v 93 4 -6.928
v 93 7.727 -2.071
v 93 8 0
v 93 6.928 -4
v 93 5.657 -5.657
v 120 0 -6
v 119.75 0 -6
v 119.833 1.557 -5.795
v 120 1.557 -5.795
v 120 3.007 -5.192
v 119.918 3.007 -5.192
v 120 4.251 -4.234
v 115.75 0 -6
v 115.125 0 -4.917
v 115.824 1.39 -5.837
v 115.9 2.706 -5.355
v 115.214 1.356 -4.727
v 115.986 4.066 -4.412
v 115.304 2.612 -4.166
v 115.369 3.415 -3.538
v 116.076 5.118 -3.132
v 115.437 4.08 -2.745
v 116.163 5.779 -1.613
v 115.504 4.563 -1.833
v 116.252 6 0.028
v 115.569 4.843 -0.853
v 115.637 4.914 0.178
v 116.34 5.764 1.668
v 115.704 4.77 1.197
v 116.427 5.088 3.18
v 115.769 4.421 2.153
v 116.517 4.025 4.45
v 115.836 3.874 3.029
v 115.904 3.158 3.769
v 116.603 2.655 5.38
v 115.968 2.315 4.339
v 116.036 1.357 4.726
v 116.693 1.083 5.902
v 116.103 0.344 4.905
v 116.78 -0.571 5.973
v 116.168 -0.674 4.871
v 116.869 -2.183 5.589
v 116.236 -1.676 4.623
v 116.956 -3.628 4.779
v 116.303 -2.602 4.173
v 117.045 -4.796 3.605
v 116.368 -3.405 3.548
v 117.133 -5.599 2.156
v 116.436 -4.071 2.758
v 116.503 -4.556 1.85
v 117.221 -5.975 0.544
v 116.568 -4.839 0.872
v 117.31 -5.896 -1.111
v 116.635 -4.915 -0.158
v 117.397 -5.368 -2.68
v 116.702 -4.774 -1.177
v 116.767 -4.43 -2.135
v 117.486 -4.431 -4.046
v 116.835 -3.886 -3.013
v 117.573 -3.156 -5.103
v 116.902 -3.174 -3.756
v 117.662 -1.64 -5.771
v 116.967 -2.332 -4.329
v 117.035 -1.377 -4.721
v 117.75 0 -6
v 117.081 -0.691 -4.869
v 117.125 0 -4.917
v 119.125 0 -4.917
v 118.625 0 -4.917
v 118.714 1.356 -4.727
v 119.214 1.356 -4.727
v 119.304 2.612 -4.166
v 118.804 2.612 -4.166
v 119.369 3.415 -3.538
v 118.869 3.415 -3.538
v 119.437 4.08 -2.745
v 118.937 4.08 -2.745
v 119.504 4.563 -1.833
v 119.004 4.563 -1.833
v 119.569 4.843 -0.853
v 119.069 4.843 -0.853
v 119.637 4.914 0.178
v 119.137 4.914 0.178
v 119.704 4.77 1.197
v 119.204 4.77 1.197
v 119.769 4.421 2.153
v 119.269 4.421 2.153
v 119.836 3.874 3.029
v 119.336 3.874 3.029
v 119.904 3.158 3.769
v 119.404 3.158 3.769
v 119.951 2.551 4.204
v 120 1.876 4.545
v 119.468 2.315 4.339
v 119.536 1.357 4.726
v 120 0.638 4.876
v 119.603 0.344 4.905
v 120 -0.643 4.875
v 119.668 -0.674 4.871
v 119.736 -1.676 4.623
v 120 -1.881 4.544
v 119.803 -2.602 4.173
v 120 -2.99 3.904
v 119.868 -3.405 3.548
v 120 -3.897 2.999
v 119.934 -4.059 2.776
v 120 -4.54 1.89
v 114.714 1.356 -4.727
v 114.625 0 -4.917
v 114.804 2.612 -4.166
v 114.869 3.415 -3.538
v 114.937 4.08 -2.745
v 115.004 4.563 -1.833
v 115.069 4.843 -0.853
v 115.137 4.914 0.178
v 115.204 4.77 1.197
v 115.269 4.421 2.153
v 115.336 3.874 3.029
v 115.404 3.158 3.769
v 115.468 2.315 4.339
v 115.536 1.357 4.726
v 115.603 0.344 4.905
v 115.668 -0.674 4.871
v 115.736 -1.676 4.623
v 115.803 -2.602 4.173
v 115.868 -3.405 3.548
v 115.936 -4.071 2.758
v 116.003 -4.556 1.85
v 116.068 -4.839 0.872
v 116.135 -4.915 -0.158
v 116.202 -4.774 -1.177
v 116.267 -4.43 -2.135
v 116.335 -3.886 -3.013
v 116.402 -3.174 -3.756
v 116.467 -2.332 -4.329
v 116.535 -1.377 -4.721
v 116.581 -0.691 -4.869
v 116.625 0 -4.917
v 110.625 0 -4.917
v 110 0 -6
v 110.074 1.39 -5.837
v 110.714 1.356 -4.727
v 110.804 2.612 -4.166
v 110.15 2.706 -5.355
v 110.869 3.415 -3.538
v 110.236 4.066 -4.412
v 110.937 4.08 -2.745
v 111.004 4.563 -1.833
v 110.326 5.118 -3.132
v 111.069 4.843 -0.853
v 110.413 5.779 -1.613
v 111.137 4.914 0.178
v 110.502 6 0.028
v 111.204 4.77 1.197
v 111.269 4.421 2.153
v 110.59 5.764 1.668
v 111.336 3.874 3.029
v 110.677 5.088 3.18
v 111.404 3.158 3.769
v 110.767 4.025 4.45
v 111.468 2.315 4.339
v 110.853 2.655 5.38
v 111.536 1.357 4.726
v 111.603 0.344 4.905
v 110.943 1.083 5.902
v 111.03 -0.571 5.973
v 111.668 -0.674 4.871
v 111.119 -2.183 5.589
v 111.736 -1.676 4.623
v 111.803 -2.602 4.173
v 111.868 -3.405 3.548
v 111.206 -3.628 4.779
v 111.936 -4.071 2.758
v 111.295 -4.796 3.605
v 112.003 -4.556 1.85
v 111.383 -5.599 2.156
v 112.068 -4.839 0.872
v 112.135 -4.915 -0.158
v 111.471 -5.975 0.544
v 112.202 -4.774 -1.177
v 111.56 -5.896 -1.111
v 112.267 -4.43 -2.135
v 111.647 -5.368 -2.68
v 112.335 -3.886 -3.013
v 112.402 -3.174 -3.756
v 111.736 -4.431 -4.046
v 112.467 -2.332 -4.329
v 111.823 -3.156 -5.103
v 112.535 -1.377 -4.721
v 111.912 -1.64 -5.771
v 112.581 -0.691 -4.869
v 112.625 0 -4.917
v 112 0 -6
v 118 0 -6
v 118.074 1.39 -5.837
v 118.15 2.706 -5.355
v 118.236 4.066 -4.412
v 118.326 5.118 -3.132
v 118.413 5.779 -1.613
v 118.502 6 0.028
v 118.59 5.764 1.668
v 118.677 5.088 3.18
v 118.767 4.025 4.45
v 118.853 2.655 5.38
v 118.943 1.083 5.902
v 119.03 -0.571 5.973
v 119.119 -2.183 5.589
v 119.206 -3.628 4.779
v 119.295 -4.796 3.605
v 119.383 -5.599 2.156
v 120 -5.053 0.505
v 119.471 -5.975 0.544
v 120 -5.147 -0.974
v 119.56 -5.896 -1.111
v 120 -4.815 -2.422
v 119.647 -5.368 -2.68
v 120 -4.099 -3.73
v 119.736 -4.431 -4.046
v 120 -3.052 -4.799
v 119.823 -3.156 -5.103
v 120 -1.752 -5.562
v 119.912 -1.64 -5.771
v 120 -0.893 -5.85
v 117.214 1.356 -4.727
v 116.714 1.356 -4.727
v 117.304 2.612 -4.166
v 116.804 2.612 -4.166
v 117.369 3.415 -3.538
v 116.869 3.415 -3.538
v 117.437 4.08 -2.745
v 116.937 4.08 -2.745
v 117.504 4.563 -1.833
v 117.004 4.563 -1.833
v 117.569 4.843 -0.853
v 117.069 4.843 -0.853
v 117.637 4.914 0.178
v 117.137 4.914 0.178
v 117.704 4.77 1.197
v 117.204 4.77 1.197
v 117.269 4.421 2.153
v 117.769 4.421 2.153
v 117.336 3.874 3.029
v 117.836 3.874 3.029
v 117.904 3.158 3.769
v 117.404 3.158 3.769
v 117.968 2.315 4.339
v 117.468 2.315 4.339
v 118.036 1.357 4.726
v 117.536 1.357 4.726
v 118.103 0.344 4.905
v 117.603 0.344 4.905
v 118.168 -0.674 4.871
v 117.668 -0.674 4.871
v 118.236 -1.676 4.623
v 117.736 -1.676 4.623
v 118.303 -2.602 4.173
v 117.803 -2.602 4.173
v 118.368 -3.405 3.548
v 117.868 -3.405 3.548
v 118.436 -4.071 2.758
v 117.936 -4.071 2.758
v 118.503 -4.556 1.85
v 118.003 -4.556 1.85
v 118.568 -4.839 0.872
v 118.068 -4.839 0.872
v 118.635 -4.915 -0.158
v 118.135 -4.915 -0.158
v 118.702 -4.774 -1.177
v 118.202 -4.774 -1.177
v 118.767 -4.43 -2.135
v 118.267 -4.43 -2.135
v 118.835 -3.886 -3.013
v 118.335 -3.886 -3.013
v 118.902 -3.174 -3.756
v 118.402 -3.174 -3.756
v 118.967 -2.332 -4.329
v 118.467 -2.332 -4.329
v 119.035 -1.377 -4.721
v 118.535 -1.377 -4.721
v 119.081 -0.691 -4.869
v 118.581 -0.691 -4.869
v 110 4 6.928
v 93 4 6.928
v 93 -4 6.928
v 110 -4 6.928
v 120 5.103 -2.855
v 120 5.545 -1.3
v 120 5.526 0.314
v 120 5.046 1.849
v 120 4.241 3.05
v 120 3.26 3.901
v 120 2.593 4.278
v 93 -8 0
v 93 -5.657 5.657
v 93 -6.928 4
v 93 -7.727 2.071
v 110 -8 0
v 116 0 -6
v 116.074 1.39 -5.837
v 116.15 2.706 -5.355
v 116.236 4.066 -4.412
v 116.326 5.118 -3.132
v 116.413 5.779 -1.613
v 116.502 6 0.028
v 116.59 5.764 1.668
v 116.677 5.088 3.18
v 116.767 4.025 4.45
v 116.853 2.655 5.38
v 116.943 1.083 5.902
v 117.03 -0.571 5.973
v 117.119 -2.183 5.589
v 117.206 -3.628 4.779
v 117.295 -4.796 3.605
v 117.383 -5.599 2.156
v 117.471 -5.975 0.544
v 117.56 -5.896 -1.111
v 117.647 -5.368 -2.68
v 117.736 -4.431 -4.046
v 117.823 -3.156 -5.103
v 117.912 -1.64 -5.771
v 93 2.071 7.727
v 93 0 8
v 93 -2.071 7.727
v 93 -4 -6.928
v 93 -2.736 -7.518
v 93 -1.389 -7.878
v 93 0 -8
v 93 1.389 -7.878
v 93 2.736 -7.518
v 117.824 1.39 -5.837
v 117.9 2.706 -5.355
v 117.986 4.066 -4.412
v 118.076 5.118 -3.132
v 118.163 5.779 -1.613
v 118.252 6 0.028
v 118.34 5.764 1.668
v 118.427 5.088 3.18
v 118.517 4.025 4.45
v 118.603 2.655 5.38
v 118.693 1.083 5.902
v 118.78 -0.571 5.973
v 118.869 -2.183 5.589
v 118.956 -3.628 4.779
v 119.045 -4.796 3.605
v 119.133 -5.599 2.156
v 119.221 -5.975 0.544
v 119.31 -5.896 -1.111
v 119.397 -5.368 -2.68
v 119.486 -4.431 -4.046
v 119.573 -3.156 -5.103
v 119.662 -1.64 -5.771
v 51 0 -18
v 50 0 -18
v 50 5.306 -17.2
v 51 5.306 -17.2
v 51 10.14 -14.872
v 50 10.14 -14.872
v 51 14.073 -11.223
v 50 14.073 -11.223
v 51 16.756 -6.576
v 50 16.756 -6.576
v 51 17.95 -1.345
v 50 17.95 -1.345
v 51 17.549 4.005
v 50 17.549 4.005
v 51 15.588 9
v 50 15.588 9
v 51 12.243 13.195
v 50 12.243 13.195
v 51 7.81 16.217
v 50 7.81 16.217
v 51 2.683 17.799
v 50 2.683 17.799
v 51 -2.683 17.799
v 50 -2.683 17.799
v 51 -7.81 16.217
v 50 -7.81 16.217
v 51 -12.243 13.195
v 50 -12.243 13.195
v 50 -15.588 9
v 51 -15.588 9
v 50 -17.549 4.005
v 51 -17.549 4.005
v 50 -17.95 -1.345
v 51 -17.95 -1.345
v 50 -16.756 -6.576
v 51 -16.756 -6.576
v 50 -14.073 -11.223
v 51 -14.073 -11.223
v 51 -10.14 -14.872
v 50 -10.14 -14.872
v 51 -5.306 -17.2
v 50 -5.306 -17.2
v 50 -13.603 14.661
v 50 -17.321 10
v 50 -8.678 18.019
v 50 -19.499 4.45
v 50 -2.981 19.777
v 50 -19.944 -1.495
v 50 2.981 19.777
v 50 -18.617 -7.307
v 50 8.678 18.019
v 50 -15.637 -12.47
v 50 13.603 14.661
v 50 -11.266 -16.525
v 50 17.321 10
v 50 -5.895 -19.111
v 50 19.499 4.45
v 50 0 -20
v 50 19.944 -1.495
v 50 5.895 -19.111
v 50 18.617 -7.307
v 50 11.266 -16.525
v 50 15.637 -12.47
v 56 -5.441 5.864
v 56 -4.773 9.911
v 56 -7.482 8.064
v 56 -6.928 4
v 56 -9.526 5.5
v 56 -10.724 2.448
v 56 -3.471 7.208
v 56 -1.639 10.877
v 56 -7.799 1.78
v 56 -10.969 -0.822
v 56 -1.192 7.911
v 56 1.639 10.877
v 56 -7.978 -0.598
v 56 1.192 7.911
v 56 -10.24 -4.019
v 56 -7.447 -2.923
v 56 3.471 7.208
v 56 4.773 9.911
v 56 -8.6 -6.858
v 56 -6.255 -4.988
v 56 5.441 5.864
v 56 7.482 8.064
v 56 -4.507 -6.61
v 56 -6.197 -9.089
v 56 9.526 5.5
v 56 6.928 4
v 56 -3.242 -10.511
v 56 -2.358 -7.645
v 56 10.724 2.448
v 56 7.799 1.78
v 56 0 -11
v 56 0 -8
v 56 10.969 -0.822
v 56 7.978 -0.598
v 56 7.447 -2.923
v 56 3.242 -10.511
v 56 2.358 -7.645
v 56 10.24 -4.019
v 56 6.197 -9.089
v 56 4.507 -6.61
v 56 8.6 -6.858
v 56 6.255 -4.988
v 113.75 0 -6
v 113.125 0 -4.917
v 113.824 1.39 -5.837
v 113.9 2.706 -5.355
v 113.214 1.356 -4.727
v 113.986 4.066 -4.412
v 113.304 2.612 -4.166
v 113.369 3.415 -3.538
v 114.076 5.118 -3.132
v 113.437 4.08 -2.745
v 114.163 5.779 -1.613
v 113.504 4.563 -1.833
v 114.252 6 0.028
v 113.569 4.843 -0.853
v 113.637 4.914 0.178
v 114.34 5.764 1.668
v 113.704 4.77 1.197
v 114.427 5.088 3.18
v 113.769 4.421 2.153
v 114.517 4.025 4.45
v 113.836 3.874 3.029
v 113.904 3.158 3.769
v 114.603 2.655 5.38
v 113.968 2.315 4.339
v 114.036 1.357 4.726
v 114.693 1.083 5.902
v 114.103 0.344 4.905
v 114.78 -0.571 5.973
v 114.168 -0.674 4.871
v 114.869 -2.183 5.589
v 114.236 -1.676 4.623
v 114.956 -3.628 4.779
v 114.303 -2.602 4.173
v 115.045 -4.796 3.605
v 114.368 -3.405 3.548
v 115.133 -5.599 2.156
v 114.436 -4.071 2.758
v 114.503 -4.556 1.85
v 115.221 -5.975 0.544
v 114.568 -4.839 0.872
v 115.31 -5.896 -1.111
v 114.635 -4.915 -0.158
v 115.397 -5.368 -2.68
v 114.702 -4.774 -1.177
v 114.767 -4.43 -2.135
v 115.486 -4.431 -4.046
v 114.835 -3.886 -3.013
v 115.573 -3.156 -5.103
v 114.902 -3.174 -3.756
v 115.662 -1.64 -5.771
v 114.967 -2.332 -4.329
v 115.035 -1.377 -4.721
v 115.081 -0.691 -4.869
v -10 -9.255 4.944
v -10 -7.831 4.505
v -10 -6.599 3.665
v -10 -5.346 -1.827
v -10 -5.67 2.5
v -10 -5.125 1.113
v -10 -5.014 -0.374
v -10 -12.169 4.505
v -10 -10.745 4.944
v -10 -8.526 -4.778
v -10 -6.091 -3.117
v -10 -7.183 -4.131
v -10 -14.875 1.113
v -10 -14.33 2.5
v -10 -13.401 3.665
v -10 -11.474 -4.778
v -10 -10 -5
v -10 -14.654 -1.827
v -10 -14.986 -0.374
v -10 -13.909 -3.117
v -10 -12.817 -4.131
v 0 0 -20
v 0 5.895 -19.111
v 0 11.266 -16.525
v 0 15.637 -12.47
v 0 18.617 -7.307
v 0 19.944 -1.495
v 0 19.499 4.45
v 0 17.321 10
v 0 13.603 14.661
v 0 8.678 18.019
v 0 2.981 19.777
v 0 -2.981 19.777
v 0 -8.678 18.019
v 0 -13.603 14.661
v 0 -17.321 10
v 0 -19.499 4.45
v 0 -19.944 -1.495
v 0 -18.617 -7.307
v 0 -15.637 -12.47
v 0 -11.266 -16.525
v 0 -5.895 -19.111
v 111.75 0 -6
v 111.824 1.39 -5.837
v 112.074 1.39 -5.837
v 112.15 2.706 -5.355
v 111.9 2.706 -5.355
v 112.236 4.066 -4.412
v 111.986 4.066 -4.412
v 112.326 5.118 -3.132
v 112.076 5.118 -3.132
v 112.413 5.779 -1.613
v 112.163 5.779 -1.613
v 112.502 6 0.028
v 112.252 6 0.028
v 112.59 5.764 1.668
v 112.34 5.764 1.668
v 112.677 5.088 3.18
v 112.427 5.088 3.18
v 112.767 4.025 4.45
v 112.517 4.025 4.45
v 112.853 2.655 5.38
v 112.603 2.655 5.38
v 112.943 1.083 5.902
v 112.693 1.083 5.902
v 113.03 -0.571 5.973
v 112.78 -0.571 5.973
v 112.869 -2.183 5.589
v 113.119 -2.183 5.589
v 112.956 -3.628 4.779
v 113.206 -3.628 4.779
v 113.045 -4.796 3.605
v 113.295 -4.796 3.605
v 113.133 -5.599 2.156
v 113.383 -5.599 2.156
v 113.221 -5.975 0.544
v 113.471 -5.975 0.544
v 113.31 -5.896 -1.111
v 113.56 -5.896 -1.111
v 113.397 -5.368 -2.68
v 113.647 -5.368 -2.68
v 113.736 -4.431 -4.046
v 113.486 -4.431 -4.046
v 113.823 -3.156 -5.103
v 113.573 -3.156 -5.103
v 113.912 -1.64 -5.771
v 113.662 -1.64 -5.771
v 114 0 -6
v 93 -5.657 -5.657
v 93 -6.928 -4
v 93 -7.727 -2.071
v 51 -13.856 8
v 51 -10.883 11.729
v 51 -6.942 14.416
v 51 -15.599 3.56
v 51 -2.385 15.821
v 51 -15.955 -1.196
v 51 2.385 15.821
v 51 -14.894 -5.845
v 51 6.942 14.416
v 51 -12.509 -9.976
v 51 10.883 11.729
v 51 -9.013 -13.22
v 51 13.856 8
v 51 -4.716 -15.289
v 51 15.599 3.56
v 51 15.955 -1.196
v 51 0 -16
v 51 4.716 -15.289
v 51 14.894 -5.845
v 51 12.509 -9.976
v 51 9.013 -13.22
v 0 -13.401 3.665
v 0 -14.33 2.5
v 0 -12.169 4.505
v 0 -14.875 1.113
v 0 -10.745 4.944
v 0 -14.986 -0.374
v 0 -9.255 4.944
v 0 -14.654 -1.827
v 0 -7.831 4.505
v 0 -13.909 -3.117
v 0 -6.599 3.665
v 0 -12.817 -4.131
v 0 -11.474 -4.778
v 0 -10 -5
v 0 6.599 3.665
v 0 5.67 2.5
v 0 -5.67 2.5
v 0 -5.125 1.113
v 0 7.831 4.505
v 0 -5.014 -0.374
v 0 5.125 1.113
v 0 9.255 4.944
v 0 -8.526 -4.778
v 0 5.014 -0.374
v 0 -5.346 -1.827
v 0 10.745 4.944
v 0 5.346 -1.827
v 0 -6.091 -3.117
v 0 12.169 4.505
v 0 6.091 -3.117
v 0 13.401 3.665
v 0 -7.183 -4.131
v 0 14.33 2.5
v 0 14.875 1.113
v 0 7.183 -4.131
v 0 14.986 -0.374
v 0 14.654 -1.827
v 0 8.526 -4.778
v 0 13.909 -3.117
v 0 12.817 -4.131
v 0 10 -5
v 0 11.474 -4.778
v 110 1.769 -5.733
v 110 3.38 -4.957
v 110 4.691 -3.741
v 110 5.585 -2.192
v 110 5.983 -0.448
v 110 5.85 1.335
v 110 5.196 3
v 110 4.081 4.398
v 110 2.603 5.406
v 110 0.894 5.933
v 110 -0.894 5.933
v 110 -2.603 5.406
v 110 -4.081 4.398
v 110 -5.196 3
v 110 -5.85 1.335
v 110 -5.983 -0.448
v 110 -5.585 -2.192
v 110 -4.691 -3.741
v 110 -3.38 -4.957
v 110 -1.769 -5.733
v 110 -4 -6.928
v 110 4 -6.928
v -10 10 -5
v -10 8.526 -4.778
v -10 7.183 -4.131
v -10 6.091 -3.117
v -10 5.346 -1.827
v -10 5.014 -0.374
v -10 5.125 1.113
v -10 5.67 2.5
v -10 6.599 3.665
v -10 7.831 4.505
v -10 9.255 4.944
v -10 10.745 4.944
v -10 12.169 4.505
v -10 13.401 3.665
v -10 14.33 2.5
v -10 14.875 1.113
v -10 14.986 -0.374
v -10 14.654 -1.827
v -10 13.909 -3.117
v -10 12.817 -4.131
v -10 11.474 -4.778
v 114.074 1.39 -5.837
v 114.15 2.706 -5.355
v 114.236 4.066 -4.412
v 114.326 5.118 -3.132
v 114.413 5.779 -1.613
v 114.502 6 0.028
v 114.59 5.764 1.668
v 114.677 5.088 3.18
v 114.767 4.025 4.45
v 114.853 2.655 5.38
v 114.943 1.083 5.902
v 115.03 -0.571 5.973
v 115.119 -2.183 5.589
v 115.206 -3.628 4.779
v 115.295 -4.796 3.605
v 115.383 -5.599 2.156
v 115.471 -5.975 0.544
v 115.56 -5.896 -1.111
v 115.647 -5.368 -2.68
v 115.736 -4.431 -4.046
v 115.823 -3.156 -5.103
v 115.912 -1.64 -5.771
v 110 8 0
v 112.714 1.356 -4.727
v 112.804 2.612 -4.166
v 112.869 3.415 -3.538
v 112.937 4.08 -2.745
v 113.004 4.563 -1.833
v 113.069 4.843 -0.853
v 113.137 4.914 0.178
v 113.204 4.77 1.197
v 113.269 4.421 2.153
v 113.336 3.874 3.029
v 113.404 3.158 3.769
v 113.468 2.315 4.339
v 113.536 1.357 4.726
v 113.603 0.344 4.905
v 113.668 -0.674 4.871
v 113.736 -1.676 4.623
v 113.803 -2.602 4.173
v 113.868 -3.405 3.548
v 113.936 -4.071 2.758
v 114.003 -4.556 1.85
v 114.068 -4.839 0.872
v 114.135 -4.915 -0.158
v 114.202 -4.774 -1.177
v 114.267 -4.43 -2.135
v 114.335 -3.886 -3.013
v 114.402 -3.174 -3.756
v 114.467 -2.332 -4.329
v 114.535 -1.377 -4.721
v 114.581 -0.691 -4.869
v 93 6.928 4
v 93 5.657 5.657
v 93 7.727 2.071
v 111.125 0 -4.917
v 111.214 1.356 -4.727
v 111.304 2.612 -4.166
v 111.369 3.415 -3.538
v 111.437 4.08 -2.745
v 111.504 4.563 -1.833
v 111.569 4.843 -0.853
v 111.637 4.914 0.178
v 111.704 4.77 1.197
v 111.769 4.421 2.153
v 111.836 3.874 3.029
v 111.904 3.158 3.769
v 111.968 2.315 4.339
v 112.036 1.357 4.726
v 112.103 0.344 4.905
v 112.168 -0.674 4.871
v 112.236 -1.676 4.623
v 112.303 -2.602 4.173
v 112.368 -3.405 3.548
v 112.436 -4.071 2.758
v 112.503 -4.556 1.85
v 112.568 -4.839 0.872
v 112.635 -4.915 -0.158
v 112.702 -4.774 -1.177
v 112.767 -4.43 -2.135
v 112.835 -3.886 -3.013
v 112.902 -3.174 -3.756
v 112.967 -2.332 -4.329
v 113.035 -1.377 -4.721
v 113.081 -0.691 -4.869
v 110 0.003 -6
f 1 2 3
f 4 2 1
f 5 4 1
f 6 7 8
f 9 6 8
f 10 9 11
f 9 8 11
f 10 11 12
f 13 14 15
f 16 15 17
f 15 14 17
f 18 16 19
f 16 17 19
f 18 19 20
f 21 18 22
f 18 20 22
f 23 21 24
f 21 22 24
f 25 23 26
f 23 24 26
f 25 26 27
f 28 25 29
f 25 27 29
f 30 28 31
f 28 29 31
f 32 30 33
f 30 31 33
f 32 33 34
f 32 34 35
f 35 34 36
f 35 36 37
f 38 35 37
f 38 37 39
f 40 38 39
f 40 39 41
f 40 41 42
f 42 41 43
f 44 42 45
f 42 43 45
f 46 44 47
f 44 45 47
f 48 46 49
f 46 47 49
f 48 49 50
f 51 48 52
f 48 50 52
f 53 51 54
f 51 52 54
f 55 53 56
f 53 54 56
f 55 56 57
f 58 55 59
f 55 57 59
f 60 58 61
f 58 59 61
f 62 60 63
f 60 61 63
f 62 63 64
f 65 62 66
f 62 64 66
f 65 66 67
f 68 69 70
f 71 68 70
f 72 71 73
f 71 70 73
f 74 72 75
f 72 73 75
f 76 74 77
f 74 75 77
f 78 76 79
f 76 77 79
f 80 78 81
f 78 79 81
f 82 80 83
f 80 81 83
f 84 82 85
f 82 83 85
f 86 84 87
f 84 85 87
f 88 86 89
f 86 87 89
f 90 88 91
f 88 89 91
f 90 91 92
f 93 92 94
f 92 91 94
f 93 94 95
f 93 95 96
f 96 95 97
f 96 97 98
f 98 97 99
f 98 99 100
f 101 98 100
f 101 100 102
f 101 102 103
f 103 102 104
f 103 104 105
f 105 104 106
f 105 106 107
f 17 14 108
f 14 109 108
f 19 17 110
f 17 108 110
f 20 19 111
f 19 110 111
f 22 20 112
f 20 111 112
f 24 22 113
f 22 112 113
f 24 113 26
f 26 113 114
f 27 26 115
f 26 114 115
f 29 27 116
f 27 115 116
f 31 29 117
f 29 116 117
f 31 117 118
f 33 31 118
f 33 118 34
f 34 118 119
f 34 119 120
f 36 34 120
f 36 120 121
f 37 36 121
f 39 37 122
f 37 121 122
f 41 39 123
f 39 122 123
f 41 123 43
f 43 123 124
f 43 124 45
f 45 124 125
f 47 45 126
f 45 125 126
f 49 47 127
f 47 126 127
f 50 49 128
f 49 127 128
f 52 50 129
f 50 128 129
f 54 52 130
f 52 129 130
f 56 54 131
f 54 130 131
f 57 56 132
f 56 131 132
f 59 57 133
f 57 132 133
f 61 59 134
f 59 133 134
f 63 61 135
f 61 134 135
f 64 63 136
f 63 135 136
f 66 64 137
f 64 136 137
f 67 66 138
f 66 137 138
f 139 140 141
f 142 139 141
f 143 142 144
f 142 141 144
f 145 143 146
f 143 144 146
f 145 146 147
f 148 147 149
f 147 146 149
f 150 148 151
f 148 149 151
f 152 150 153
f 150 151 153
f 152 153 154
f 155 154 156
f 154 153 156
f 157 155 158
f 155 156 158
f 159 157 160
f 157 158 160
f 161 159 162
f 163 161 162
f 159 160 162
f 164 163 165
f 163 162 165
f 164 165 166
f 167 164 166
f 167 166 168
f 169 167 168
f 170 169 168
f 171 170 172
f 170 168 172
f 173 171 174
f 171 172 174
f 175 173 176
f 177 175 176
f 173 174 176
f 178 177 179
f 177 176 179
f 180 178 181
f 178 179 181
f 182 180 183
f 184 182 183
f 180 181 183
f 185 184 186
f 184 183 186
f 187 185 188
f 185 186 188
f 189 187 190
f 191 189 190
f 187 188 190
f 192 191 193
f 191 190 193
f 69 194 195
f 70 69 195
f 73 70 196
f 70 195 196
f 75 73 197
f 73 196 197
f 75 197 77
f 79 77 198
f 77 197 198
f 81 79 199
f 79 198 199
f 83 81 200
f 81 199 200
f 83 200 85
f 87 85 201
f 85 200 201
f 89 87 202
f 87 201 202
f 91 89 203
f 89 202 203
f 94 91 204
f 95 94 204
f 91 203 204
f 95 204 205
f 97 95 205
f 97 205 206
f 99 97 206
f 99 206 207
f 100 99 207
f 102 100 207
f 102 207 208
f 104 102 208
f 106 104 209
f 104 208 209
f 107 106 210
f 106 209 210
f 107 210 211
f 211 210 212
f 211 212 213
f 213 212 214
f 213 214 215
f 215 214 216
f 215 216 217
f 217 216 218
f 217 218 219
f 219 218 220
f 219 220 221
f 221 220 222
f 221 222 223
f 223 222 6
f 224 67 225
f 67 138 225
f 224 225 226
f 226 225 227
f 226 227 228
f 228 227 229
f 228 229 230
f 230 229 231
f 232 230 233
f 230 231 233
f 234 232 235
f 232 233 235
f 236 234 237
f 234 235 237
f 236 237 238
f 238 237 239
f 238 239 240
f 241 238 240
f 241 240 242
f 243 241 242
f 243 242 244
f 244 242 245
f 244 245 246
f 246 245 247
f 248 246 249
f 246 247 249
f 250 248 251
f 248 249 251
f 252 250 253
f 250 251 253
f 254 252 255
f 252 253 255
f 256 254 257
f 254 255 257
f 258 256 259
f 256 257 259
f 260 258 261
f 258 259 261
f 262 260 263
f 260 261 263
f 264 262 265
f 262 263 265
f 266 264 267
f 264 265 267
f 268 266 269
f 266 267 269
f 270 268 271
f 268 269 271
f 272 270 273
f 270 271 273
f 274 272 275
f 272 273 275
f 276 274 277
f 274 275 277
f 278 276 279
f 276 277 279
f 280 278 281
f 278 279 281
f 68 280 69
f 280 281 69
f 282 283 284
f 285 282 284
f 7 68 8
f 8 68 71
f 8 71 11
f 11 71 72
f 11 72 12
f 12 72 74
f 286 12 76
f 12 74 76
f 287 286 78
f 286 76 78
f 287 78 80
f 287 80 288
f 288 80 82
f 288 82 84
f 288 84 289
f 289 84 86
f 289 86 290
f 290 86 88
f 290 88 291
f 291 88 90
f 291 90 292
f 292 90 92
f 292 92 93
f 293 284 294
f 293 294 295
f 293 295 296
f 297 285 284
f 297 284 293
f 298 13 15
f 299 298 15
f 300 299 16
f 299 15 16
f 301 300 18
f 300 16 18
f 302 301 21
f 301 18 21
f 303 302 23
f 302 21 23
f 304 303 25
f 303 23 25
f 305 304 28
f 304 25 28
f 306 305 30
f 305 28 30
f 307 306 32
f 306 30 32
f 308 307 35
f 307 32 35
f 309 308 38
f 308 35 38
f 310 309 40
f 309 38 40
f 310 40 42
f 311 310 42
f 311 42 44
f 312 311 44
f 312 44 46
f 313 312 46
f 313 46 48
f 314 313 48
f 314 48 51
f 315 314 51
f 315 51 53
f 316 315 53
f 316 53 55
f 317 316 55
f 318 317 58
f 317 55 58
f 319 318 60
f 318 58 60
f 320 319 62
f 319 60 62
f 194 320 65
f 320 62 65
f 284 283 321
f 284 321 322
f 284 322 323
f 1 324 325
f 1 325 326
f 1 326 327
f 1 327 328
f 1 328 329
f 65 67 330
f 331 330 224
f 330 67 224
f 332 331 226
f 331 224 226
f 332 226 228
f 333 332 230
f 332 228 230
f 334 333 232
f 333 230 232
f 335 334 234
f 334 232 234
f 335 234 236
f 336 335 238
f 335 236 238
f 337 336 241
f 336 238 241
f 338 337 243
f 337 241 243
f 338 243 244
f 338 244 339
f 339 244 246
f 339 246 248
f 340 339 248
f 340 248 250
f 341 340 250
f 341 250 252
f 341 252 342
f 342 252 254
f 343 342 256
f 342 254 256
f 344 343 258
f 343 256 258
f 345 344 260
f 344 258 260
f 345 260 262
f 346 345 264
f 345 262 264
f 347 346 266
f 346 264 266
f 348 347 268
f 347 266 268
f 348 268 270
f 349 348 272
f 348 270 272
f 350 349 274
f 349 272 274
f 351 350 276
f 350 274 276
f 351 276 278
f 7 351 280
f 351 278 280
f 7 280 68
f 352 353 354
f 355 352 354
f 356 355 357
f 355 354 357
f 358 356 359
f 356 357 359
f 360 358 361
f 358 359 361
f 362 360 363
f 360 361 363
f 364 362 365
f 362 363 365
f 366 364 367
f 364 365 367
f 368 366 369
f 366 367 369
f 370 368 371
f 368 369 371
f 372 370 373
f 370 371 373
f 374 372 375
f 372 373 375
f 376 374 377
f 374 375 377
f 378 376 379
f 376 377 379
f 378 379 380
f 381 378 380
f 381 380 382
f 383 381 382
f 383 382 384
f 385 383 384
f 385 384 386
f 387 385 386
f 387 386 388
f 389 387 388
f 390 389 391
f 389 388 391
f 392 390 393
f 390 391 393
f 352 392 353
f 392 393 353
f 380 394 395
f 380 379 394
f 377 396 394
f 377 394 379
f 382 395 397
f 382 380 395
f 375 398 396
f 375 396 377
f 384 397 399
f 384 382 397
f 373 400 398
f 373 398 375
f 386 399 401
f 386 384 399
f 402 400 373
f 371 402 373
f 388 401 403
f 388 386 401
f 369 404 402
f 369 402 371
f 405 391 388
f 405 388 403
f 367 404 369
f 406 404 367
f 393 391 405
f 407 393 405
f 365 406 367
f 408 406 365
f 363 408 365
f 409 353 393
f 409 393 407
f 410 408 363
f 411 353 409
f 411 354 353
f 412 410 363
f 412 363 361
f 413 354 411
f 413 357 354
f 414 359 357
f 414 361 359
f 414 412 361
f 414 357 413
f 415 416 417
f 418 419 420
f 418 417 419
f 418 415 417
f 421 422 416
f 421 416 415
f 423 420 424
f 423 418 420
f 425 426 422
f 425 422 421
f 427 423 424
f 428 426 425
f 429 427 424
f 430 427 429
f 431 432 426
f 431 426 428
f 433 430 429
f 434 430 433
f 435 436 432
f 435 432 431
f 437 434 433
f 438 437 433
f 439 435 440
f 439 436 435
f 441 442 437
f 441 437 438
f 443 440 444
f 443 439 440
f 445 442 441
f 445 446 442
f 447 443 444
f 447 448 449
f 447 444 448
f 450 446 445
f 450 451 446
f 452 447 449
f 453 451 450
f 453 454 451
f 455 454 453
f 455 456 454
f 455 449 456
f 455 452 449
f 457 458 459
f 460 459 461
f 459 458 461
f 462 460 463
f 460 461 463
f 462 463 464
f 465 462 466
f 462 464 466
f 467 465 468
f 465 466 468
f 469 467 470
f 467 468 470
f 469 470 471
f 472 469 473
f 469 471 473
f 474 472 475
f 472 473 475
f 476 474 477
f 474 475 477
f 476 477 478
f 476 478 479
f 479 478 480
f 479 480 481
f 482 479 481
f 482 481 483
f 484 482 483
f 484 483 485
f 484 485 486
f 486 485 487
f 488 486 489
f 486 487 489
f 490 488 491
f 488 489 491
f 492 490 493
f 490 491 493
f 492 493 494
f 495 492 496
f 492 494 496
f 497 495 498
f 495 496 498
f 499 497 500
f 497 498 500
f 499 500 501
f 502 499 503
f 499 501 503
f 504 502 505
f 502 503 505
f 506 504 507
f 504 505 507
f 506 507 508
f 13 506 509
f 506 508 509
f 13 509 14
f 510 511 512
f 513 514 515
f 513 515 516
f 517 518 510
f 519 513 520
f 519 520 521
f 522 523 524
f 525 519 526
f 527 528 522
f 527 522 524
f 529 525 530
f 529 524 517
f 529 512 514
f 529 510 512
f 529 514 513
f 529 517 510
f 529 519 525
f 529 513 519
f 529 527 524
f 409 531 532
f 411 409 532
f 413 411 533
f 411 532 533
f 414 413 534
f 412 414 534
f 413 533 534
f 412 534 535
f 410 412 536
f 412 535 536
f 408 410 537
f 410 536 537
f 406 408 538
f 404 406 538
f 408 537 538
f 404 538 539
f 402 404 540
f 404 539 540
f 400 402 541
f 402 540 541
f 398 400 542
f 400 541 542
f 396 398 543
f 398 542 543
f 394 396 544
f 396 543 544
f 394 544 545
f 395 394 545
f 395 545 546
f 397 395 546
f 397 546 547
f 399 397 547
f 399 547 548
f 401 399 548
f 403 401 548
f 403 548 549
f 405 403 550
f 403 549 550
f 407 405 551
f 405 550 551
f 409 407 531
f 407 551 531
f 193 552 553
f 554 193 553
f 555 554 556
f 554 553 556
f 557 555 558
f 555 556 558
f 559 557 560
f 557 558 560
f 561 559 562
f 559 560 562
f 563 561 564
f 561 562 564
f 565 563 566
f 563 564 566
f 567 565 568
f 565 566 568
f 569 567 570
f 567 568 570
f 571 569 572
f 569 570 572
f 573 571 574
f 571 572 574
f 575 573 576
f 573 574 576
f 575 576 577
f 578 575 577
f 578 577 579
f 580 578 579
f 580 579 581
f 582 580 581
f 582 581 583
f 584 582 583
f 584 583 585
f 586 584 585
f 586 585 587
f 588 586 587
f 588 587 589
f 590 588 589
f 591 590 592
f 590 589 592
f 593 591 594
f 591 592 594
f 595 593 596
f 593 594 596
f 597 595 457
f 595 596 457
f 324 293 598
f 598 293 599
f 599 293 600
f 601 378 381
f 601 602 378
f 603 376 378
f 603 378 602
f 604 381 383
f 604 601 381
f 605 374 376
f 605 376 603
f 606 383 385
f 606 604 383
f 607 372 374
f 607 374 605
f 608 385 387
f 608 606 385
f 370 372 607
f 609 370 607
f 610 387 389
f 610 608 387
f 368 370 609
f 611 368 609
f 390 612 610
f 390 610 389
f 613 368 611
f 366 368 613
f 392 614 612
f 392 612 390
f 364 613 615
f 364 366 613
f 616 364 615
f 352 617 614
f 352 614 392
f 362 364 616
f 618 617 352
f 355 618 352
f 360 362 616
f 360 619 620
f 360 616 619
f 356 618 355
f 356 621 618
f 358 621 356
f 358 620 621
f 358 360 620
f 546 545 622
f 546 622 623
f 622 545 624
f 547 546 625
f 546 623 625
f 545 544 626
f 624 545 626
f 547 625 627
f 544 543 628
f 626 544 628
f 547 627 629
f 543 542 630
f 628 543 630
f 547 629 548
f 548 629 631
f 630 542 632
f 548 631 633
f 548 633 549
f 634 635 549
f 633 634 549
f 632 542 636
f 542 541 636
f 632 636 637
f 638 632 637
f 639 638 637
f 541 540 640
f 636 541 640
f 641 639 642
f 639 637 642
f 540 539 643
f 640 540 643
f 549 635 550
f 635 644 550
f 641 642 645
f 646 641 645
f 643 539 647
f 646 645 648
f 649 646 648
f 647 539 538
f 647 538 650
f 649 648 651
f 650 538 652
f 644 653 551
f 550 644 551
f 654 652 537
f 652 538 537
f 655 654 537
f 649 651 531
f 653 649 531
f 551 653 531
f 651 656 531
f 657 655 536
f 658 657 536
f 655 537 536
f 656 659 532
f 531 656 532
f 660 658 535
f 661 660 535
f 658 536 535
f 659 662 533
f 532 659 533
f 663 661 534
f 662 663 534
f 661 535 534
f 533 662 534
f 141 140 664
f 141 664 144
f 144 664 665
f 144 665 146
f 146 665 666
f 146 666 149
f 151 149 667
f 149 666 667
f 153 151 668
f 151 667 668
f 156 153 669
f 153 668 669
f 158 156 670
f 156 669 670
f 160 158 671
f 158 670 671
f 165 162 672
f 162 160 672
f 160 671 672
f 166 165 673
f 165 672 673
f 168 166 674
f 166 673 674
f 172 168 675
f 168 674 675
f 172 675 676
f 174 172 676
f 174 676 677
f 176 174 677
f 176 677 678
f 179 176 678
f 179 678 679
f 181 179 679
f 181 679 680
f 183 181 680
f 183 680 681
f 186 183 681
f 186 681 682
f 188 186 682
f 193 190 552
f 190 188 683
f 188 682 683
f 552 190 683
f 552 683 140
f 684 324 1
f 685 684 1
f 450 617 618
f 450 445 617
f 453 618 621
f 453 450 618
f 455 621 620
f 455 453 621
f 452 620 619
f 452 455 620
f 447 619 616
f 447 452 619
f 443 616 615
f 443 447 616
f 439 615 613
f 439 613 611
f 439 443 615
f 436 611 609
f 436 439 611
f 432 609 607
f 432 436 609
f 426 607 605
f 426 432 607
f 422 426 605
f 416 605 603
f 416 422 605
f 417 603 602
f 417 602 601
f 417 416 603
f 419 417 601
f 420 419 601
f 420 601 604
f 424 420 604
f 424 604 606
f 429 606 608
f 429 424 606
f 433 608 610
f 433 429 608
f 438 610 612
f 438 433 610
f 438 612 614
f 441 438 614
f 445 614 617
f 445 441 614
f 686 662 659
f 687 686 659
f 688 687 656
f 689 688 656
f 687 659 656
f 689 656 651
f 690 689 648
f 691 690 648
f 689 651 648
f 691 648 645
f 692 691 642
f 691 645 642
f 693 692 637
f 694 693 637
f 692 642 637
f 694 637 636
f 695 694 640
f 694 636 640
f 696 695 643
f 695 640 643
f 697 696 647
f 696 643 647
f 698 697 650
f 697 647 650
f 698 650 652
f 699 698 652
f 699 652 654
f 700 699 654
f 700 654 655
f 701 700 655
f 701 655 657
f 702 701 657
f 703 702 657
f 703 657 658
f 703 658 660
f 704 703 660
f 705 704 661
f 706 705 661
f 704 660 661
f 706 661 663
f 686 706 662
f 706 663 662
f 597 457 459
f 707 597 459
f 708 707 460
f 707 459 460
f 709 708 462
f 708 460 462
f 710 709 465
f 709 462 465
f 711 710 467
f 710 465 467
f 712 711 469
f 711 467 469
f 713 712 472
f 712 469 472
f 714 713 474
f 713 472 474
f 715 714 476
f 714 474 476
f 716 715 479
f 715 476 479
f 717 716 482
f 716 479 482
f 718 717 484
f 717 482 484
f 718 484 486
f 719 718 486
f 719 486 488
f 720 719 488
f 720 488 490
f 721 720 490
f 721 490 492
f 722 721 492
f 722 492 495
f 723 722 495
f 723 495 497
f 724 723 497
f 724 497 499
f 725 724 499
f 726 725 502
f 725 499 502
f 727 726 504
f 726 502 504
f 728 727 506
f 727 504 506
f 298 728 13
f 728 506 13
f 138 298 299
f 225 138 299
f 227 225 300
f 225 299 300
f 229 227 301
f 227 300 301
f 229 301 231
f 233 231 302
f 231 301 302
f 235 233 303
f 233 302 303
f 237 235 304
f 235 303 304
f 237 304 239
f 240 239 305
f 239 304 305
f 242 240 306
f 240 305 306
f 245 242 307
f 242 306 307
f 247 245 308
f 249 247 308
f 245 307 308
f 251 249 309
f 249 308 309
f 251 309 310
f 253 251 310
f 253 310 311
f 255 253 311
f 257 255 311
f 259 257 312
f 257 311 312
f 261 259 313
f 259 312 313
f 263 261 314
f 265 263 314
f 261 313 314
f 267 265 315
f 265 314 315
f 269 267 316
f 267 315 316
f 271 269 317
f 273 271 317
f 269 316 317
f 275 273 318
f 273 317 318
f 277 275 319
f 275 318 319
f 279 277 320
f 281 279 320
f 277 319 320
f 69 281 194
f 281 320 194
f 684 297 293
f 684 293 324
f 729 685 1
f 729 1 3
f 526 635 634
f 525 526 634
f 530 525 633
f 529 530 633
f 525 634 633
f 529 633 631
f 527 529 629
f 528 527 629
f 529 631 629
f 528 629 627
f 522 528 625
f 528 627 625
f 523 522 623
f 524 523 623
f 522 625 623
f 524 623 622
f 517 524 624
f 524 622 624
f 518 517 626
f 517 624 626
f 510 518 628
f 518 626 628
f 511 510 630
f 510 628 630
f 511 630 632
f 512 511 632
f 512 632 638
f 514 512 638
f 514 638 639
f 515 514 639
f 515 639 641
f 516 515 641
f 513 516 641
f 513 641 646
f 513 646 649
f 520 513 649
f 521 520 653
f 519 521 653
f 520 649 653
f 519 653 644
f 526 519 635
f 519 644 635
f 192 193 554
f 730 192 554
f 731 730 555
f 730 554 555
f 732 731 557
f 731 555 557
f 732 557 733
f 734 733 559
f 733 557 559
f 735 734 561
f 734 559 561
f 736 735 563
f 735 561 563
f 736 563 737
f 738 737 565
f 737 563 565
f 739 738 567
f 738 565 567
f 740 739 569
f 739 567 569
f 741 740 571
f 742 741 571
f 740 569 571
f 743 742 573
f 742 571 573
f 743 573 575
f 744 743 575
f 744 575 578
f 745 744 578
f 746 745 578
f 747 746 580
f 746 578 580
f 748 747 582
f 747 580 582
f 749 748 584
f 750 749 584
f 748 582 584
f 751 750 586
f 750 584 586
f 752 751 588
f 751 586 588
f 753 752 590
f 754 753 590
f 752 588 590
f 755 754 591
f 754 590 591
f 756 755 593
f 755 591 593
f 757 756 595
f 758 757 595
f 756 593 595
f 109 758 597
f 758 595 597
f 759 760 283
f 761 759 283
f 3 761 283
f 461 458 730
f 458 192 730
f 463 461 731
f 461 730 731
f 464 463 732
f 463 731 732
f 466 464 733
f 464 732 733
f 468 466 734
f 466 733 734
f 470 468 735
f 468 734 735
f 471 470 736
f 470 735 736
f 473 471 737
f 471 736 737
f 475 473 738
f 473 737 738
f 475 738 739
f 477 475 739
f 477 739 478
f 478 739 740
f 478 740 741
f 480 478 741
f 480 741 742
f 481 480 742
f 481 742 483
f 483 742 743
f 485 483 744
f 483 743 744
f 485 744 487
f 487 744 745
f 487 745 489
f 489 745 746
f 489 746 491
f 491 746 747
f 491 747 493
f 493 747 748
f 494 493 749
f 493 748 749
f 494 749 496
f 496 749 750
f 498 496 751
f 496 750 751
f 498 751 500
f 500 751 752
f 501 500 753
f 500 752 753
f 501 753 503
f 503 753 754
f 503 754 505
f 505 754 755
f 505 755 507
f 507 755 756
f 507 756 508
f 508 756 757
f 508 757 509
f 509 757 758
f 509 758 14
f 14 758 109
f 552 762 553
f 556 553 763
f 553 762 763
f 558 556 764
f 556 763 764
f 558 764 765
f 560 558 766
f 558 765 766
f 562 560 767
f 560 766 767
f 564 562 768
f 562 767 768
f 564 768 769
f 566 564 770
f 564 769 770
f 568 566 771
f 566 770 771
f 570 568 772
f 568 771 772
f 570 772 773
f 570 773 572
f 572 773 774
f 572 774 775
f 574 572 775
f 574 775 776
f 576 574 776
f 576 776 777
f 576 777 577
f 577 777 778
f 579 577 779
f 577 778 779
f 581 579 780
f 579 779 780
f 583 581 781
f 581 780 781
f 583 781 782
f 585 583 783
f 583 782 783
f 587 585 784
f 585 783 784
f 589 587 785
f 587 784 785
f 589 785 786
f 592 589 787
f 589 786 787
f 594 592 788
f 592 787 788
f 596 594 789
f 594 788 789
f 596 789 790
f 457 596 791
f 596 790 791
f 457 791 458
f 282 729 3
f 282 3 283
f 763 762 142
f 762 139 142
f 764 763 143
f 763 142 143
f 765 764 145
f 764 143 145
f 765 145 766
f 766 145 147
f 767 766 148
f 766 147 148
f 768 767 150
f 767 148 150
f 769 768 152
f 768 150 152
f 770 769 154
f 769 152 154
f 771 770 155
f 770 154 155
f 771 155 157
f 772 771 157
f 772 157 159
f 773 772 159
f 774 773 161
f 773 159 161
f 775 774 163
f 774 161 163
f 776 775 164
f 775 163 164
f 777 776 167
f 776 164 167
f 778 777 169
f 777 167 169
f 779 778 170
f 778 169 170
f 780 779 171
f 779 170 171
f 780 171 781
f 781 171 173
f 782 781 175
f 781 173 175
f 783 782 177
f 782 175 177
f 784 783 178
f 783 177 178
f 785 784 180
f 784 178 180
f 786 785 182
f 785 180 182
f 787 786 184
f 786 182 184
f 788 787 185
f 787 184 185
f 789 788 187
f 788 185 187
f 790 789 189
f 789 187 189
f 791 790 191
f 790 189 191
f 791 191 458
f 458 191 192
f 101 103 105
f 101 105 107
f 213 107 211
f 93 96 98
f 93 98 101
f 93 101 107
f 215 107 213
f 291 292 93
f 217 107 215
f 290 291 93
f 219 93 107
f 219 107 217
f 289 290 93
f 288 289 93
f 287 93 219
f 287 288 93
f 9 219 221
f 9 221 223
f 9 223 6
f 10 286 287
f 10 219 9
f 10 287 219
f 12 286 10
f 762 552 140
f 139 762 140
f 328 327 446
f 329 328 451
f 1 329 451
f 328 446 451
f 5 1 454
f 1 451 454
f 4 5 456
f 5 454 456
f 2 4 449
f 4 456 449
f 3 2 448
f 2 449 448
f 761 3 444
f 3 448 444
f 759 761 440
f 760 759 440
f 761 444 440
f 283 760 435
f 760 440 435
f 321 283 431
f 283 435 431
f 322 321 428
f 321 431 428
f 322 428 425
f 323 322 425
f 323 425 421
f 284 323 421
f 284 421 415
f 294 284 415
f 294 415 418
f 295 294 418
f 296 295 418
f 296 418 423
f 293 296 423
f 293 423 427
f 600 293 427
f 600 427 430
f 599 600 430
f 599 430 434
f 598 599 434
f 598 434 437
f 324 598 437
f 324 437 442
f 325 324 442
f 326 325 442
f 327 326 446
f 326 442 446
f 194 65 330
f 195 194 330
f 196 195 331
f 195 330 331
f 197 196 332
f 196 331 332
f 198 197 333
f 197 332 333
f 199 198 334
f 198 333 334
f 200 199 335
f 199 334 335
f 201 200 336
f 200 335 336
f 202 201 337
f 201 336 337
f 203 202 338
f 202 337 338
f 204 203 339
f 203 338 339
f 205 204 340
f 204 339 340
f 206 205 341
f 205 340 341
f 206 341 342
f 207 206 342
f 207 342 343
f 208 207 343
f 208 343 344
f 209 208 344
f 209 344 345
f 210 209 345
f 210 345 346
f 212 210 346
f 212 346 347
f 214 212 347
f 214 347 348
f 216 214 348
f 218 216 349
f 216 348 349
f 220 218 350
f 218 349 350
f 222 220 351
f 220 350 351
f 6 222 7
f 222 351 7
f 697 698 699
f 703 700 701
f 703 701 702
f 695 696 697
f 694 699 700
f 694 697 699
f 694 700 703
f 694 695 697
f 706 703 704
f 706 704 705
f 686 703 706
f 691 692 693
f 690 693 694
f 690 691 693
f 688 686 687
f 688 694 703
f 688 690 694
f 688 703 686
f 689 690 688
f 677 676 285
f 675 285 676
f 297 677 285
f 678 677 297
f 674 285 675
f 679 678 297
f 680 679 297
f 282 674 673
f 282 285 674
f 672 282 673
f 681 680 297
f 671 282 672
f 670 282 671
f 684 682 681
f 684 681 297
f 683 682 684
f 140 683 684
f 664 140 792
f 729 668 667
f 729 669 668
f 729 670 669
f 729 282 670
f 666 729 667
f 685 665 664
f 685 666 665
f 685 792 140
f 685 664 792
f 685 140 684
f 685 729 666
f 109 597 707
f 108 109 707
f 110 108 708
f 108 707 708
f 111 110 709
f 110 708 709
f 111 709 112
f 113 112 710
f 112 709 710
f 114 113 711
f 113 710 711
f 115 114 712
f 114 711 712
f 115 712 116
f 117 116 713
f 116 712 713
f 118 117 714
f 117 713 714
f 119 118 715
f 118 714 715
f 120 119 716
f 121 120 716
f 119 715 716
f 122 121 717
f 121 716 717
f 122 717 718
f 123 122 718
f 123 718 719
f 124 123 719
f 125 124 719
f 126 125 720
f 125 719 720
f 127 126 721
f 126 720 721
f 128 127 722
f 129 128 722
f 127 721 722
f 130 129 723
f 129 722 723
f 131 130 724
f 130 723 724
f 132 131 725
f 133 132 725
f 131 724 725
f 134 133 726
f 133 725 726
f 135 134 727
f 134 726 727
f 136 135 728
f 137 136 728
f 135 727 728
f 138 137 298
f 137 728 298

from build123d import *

# Parameters (mm, degrees)
SKETCH1_R           = 20
BOSS_EXTRUDE1_DEPTH = 50
SKETCH2_R           = 5
BOSS_EXTRUDE2_DEPTH = 10
SKETCH3_R           = 18
BOSS_EXTRUDE3_DEPTH = 1
SKETCH4_R           = 16
BOSS_EXTRUDE4_DEPTH = 5
BOSS_EXTRUDE4_TAPER = 45
SKETCH5_R           = 8
BOSS_EXTRUDE5_DEPTH = 37
BOSS_EXTRUDE6_DEPTH = 17
SKETCH7_R           = 6
BOSS_EXTRUDE7_DEPTH = 10
THREAD1_PITCH       = 2


with BuildPart() as part:
    # Sketch1 → Boss-Extrude1 (new body)
    with BuildSketch(Plane(origin=(0, 0, 0), x_dir=(0, 0, -1), z_dir=(1, 0, 0))):
        Circle(SKETCH1_R)
    extrude(amount=BOSS_EXTRUDE1_DEPTH)

    # Sketch2 → Boss-Extrude2 (add)
    with BuildSketch(Plane.ZY):
        with Locations(Location((0, 10, 0), (0, 0, 180))):
            Circle(SKETCH2_R)
        with Locations(Location((0, -10, 0), (0, 0, 180))):
            Circle(SKETCH2_R)
    extrude(amount=BOSS_EXTRUDE2_DEPTH)

    # Sketch3 → Boss-Extrude3 (add)
    with BuildSketch(Plane(origin=(50, 0, 0), x_dir=(0, 0, -1), z_dir=(1, 0, 0))):
        Circle(SKETCH3_R)
    extrude(amount=BOSS_EXTRUDE3_DEPTH)

    # Sketch4 → Boss-Extrude4 (add)
    with BuildSketch(Plane(origin=(51, 0, 0), x_dir=(0, 0, -1), z_dir=(1, 0, 0))):
        Circle(SKETCH4_R)
    extrude(amount=BOSS_EXTRUDE4_DEPTH, taper=BOSS_EXTRUDE4_TAPER)

    # Sketch5 → Boss-Extrude5 (add)
    with BuildSketch(Plane(origin=(56, 0, 0), x_dir=(0, 0, -1), z_dir=(1, 0, 0))):
        Circle(SKETCH5_R)
    extrude(amount=BOSS_EXTRUDE5_DEPTH)

    # Sketch6 → Boss-Extrude6 (add)
    with BuildSketch(Plane(origin=(93, 0, 0), x_dir=(0, 0, -1), z_dir=(1, 0, 0))):
        Polygon((6.92820323, 4), (0, 8), (-6.92820323, 4), (-6.92820323, -4), (0, -8), (6.92820323, -4), align=None)
    extrude(amount=BOSS_EXTRUDE6_DEPTH)

    # Sketch7 → Boss-Extrude7 (add)
    with BuildSketch(Plane(origin=(110, 0, 0), x_dir=(0, 0, -1), z_dir=(1, 0, 0))):
        Circle(SKETCH7_R)
    extrude(amount=BOSS_EXTRUDE7_DEPTH)

    # Thread1: the profile of Thread Profile1 profile screwed along a right-hand helix of 5 turns, 10 arcs to a turn; built about Z, then put on its axis
    thread1_z = Axis((0, 0, 0), (0, 0, 1))
    thread1_corners = [(6.0003, 0, -0.000173205), (6.0003, 0, 1.7501732), (4.91746825, 0, 1.124999997), (4.91746825, 0, 0.624999997)]
    with BuildLine(mode=Mode.PRIVATE) as thread1_profile:
        Line(thread1_corners[0], thread1_corners[1])
        Line(thread1_corners[1], thread1_corners[2])
        Line(thread1_corners[2], thread1_corners[3])
        Line(thread1_corners[3], thread1_corners[0])
    thread1_cap = Face(thread1_profile.wire())
    thread1_turn_angles = [0, 18, 36, 54, 72, 90, 108, 126, 144, 162, 180, 198, 216, 234, 252, 270, 288, 306, 324, 342, 360]
    thread1_turn_weights = [1, 0.9510565162951535, 1, 0.9510565162951535, 1, 0.9510565162951535, 1, 0.9510565162951535, 1, 0.9510565162951535, 1, 0.9510565162951535, 1, 0.9510565162951535, 1, 0.9510565162951535, 1, 0.9510565162951535, 1, 0.9510565162951535, 1]
    thread1_turn_rails = [Edge.make_bspline([Vector(p[0], p[1], 0).rotate(thread1_z, thread1_turn_angles[k]) / thread1_turn_weights[k] + Vector(0, 0, p[2] + THREAD1_PITCH * thread1_turn_angles[k] / 360) for k in range(21)], [0, 0, 0, 1, 1, 2, 2, 3, 3, 4, 4, 5, 5, 6, 6, 7, 7, 8, 8, 9, 9, 10, 10, 10], 2, thread1_turn_weights) for p in thread1_corners]
    thread1_turn_sides = [Face.make_surface_from_curves(thread1_turn_rails[p[0]], thread1_turn_rails[p[1]]) for p in [(0, 1), (1, 2), (2, 3), (3, 0)]]
    thread1 = Plane(origin=(110, 0, 0), x_dir=(0, 0, -1), z_dir=(1, 0, 0)) * Solid(Shell([*[p.moved(Location((0, 0, THREAD1_PITCH * i))) for i in range(5) for p in thread1_turn_sides], thread1_cap, thread1_cap.rotate(thread1_z, 1800).moved(Location((0, 0, THREAD1_PITCH * 1800 / 360)))]))
    add(thread1, mode=Mode.SUBTRACT)


solid = part.part
